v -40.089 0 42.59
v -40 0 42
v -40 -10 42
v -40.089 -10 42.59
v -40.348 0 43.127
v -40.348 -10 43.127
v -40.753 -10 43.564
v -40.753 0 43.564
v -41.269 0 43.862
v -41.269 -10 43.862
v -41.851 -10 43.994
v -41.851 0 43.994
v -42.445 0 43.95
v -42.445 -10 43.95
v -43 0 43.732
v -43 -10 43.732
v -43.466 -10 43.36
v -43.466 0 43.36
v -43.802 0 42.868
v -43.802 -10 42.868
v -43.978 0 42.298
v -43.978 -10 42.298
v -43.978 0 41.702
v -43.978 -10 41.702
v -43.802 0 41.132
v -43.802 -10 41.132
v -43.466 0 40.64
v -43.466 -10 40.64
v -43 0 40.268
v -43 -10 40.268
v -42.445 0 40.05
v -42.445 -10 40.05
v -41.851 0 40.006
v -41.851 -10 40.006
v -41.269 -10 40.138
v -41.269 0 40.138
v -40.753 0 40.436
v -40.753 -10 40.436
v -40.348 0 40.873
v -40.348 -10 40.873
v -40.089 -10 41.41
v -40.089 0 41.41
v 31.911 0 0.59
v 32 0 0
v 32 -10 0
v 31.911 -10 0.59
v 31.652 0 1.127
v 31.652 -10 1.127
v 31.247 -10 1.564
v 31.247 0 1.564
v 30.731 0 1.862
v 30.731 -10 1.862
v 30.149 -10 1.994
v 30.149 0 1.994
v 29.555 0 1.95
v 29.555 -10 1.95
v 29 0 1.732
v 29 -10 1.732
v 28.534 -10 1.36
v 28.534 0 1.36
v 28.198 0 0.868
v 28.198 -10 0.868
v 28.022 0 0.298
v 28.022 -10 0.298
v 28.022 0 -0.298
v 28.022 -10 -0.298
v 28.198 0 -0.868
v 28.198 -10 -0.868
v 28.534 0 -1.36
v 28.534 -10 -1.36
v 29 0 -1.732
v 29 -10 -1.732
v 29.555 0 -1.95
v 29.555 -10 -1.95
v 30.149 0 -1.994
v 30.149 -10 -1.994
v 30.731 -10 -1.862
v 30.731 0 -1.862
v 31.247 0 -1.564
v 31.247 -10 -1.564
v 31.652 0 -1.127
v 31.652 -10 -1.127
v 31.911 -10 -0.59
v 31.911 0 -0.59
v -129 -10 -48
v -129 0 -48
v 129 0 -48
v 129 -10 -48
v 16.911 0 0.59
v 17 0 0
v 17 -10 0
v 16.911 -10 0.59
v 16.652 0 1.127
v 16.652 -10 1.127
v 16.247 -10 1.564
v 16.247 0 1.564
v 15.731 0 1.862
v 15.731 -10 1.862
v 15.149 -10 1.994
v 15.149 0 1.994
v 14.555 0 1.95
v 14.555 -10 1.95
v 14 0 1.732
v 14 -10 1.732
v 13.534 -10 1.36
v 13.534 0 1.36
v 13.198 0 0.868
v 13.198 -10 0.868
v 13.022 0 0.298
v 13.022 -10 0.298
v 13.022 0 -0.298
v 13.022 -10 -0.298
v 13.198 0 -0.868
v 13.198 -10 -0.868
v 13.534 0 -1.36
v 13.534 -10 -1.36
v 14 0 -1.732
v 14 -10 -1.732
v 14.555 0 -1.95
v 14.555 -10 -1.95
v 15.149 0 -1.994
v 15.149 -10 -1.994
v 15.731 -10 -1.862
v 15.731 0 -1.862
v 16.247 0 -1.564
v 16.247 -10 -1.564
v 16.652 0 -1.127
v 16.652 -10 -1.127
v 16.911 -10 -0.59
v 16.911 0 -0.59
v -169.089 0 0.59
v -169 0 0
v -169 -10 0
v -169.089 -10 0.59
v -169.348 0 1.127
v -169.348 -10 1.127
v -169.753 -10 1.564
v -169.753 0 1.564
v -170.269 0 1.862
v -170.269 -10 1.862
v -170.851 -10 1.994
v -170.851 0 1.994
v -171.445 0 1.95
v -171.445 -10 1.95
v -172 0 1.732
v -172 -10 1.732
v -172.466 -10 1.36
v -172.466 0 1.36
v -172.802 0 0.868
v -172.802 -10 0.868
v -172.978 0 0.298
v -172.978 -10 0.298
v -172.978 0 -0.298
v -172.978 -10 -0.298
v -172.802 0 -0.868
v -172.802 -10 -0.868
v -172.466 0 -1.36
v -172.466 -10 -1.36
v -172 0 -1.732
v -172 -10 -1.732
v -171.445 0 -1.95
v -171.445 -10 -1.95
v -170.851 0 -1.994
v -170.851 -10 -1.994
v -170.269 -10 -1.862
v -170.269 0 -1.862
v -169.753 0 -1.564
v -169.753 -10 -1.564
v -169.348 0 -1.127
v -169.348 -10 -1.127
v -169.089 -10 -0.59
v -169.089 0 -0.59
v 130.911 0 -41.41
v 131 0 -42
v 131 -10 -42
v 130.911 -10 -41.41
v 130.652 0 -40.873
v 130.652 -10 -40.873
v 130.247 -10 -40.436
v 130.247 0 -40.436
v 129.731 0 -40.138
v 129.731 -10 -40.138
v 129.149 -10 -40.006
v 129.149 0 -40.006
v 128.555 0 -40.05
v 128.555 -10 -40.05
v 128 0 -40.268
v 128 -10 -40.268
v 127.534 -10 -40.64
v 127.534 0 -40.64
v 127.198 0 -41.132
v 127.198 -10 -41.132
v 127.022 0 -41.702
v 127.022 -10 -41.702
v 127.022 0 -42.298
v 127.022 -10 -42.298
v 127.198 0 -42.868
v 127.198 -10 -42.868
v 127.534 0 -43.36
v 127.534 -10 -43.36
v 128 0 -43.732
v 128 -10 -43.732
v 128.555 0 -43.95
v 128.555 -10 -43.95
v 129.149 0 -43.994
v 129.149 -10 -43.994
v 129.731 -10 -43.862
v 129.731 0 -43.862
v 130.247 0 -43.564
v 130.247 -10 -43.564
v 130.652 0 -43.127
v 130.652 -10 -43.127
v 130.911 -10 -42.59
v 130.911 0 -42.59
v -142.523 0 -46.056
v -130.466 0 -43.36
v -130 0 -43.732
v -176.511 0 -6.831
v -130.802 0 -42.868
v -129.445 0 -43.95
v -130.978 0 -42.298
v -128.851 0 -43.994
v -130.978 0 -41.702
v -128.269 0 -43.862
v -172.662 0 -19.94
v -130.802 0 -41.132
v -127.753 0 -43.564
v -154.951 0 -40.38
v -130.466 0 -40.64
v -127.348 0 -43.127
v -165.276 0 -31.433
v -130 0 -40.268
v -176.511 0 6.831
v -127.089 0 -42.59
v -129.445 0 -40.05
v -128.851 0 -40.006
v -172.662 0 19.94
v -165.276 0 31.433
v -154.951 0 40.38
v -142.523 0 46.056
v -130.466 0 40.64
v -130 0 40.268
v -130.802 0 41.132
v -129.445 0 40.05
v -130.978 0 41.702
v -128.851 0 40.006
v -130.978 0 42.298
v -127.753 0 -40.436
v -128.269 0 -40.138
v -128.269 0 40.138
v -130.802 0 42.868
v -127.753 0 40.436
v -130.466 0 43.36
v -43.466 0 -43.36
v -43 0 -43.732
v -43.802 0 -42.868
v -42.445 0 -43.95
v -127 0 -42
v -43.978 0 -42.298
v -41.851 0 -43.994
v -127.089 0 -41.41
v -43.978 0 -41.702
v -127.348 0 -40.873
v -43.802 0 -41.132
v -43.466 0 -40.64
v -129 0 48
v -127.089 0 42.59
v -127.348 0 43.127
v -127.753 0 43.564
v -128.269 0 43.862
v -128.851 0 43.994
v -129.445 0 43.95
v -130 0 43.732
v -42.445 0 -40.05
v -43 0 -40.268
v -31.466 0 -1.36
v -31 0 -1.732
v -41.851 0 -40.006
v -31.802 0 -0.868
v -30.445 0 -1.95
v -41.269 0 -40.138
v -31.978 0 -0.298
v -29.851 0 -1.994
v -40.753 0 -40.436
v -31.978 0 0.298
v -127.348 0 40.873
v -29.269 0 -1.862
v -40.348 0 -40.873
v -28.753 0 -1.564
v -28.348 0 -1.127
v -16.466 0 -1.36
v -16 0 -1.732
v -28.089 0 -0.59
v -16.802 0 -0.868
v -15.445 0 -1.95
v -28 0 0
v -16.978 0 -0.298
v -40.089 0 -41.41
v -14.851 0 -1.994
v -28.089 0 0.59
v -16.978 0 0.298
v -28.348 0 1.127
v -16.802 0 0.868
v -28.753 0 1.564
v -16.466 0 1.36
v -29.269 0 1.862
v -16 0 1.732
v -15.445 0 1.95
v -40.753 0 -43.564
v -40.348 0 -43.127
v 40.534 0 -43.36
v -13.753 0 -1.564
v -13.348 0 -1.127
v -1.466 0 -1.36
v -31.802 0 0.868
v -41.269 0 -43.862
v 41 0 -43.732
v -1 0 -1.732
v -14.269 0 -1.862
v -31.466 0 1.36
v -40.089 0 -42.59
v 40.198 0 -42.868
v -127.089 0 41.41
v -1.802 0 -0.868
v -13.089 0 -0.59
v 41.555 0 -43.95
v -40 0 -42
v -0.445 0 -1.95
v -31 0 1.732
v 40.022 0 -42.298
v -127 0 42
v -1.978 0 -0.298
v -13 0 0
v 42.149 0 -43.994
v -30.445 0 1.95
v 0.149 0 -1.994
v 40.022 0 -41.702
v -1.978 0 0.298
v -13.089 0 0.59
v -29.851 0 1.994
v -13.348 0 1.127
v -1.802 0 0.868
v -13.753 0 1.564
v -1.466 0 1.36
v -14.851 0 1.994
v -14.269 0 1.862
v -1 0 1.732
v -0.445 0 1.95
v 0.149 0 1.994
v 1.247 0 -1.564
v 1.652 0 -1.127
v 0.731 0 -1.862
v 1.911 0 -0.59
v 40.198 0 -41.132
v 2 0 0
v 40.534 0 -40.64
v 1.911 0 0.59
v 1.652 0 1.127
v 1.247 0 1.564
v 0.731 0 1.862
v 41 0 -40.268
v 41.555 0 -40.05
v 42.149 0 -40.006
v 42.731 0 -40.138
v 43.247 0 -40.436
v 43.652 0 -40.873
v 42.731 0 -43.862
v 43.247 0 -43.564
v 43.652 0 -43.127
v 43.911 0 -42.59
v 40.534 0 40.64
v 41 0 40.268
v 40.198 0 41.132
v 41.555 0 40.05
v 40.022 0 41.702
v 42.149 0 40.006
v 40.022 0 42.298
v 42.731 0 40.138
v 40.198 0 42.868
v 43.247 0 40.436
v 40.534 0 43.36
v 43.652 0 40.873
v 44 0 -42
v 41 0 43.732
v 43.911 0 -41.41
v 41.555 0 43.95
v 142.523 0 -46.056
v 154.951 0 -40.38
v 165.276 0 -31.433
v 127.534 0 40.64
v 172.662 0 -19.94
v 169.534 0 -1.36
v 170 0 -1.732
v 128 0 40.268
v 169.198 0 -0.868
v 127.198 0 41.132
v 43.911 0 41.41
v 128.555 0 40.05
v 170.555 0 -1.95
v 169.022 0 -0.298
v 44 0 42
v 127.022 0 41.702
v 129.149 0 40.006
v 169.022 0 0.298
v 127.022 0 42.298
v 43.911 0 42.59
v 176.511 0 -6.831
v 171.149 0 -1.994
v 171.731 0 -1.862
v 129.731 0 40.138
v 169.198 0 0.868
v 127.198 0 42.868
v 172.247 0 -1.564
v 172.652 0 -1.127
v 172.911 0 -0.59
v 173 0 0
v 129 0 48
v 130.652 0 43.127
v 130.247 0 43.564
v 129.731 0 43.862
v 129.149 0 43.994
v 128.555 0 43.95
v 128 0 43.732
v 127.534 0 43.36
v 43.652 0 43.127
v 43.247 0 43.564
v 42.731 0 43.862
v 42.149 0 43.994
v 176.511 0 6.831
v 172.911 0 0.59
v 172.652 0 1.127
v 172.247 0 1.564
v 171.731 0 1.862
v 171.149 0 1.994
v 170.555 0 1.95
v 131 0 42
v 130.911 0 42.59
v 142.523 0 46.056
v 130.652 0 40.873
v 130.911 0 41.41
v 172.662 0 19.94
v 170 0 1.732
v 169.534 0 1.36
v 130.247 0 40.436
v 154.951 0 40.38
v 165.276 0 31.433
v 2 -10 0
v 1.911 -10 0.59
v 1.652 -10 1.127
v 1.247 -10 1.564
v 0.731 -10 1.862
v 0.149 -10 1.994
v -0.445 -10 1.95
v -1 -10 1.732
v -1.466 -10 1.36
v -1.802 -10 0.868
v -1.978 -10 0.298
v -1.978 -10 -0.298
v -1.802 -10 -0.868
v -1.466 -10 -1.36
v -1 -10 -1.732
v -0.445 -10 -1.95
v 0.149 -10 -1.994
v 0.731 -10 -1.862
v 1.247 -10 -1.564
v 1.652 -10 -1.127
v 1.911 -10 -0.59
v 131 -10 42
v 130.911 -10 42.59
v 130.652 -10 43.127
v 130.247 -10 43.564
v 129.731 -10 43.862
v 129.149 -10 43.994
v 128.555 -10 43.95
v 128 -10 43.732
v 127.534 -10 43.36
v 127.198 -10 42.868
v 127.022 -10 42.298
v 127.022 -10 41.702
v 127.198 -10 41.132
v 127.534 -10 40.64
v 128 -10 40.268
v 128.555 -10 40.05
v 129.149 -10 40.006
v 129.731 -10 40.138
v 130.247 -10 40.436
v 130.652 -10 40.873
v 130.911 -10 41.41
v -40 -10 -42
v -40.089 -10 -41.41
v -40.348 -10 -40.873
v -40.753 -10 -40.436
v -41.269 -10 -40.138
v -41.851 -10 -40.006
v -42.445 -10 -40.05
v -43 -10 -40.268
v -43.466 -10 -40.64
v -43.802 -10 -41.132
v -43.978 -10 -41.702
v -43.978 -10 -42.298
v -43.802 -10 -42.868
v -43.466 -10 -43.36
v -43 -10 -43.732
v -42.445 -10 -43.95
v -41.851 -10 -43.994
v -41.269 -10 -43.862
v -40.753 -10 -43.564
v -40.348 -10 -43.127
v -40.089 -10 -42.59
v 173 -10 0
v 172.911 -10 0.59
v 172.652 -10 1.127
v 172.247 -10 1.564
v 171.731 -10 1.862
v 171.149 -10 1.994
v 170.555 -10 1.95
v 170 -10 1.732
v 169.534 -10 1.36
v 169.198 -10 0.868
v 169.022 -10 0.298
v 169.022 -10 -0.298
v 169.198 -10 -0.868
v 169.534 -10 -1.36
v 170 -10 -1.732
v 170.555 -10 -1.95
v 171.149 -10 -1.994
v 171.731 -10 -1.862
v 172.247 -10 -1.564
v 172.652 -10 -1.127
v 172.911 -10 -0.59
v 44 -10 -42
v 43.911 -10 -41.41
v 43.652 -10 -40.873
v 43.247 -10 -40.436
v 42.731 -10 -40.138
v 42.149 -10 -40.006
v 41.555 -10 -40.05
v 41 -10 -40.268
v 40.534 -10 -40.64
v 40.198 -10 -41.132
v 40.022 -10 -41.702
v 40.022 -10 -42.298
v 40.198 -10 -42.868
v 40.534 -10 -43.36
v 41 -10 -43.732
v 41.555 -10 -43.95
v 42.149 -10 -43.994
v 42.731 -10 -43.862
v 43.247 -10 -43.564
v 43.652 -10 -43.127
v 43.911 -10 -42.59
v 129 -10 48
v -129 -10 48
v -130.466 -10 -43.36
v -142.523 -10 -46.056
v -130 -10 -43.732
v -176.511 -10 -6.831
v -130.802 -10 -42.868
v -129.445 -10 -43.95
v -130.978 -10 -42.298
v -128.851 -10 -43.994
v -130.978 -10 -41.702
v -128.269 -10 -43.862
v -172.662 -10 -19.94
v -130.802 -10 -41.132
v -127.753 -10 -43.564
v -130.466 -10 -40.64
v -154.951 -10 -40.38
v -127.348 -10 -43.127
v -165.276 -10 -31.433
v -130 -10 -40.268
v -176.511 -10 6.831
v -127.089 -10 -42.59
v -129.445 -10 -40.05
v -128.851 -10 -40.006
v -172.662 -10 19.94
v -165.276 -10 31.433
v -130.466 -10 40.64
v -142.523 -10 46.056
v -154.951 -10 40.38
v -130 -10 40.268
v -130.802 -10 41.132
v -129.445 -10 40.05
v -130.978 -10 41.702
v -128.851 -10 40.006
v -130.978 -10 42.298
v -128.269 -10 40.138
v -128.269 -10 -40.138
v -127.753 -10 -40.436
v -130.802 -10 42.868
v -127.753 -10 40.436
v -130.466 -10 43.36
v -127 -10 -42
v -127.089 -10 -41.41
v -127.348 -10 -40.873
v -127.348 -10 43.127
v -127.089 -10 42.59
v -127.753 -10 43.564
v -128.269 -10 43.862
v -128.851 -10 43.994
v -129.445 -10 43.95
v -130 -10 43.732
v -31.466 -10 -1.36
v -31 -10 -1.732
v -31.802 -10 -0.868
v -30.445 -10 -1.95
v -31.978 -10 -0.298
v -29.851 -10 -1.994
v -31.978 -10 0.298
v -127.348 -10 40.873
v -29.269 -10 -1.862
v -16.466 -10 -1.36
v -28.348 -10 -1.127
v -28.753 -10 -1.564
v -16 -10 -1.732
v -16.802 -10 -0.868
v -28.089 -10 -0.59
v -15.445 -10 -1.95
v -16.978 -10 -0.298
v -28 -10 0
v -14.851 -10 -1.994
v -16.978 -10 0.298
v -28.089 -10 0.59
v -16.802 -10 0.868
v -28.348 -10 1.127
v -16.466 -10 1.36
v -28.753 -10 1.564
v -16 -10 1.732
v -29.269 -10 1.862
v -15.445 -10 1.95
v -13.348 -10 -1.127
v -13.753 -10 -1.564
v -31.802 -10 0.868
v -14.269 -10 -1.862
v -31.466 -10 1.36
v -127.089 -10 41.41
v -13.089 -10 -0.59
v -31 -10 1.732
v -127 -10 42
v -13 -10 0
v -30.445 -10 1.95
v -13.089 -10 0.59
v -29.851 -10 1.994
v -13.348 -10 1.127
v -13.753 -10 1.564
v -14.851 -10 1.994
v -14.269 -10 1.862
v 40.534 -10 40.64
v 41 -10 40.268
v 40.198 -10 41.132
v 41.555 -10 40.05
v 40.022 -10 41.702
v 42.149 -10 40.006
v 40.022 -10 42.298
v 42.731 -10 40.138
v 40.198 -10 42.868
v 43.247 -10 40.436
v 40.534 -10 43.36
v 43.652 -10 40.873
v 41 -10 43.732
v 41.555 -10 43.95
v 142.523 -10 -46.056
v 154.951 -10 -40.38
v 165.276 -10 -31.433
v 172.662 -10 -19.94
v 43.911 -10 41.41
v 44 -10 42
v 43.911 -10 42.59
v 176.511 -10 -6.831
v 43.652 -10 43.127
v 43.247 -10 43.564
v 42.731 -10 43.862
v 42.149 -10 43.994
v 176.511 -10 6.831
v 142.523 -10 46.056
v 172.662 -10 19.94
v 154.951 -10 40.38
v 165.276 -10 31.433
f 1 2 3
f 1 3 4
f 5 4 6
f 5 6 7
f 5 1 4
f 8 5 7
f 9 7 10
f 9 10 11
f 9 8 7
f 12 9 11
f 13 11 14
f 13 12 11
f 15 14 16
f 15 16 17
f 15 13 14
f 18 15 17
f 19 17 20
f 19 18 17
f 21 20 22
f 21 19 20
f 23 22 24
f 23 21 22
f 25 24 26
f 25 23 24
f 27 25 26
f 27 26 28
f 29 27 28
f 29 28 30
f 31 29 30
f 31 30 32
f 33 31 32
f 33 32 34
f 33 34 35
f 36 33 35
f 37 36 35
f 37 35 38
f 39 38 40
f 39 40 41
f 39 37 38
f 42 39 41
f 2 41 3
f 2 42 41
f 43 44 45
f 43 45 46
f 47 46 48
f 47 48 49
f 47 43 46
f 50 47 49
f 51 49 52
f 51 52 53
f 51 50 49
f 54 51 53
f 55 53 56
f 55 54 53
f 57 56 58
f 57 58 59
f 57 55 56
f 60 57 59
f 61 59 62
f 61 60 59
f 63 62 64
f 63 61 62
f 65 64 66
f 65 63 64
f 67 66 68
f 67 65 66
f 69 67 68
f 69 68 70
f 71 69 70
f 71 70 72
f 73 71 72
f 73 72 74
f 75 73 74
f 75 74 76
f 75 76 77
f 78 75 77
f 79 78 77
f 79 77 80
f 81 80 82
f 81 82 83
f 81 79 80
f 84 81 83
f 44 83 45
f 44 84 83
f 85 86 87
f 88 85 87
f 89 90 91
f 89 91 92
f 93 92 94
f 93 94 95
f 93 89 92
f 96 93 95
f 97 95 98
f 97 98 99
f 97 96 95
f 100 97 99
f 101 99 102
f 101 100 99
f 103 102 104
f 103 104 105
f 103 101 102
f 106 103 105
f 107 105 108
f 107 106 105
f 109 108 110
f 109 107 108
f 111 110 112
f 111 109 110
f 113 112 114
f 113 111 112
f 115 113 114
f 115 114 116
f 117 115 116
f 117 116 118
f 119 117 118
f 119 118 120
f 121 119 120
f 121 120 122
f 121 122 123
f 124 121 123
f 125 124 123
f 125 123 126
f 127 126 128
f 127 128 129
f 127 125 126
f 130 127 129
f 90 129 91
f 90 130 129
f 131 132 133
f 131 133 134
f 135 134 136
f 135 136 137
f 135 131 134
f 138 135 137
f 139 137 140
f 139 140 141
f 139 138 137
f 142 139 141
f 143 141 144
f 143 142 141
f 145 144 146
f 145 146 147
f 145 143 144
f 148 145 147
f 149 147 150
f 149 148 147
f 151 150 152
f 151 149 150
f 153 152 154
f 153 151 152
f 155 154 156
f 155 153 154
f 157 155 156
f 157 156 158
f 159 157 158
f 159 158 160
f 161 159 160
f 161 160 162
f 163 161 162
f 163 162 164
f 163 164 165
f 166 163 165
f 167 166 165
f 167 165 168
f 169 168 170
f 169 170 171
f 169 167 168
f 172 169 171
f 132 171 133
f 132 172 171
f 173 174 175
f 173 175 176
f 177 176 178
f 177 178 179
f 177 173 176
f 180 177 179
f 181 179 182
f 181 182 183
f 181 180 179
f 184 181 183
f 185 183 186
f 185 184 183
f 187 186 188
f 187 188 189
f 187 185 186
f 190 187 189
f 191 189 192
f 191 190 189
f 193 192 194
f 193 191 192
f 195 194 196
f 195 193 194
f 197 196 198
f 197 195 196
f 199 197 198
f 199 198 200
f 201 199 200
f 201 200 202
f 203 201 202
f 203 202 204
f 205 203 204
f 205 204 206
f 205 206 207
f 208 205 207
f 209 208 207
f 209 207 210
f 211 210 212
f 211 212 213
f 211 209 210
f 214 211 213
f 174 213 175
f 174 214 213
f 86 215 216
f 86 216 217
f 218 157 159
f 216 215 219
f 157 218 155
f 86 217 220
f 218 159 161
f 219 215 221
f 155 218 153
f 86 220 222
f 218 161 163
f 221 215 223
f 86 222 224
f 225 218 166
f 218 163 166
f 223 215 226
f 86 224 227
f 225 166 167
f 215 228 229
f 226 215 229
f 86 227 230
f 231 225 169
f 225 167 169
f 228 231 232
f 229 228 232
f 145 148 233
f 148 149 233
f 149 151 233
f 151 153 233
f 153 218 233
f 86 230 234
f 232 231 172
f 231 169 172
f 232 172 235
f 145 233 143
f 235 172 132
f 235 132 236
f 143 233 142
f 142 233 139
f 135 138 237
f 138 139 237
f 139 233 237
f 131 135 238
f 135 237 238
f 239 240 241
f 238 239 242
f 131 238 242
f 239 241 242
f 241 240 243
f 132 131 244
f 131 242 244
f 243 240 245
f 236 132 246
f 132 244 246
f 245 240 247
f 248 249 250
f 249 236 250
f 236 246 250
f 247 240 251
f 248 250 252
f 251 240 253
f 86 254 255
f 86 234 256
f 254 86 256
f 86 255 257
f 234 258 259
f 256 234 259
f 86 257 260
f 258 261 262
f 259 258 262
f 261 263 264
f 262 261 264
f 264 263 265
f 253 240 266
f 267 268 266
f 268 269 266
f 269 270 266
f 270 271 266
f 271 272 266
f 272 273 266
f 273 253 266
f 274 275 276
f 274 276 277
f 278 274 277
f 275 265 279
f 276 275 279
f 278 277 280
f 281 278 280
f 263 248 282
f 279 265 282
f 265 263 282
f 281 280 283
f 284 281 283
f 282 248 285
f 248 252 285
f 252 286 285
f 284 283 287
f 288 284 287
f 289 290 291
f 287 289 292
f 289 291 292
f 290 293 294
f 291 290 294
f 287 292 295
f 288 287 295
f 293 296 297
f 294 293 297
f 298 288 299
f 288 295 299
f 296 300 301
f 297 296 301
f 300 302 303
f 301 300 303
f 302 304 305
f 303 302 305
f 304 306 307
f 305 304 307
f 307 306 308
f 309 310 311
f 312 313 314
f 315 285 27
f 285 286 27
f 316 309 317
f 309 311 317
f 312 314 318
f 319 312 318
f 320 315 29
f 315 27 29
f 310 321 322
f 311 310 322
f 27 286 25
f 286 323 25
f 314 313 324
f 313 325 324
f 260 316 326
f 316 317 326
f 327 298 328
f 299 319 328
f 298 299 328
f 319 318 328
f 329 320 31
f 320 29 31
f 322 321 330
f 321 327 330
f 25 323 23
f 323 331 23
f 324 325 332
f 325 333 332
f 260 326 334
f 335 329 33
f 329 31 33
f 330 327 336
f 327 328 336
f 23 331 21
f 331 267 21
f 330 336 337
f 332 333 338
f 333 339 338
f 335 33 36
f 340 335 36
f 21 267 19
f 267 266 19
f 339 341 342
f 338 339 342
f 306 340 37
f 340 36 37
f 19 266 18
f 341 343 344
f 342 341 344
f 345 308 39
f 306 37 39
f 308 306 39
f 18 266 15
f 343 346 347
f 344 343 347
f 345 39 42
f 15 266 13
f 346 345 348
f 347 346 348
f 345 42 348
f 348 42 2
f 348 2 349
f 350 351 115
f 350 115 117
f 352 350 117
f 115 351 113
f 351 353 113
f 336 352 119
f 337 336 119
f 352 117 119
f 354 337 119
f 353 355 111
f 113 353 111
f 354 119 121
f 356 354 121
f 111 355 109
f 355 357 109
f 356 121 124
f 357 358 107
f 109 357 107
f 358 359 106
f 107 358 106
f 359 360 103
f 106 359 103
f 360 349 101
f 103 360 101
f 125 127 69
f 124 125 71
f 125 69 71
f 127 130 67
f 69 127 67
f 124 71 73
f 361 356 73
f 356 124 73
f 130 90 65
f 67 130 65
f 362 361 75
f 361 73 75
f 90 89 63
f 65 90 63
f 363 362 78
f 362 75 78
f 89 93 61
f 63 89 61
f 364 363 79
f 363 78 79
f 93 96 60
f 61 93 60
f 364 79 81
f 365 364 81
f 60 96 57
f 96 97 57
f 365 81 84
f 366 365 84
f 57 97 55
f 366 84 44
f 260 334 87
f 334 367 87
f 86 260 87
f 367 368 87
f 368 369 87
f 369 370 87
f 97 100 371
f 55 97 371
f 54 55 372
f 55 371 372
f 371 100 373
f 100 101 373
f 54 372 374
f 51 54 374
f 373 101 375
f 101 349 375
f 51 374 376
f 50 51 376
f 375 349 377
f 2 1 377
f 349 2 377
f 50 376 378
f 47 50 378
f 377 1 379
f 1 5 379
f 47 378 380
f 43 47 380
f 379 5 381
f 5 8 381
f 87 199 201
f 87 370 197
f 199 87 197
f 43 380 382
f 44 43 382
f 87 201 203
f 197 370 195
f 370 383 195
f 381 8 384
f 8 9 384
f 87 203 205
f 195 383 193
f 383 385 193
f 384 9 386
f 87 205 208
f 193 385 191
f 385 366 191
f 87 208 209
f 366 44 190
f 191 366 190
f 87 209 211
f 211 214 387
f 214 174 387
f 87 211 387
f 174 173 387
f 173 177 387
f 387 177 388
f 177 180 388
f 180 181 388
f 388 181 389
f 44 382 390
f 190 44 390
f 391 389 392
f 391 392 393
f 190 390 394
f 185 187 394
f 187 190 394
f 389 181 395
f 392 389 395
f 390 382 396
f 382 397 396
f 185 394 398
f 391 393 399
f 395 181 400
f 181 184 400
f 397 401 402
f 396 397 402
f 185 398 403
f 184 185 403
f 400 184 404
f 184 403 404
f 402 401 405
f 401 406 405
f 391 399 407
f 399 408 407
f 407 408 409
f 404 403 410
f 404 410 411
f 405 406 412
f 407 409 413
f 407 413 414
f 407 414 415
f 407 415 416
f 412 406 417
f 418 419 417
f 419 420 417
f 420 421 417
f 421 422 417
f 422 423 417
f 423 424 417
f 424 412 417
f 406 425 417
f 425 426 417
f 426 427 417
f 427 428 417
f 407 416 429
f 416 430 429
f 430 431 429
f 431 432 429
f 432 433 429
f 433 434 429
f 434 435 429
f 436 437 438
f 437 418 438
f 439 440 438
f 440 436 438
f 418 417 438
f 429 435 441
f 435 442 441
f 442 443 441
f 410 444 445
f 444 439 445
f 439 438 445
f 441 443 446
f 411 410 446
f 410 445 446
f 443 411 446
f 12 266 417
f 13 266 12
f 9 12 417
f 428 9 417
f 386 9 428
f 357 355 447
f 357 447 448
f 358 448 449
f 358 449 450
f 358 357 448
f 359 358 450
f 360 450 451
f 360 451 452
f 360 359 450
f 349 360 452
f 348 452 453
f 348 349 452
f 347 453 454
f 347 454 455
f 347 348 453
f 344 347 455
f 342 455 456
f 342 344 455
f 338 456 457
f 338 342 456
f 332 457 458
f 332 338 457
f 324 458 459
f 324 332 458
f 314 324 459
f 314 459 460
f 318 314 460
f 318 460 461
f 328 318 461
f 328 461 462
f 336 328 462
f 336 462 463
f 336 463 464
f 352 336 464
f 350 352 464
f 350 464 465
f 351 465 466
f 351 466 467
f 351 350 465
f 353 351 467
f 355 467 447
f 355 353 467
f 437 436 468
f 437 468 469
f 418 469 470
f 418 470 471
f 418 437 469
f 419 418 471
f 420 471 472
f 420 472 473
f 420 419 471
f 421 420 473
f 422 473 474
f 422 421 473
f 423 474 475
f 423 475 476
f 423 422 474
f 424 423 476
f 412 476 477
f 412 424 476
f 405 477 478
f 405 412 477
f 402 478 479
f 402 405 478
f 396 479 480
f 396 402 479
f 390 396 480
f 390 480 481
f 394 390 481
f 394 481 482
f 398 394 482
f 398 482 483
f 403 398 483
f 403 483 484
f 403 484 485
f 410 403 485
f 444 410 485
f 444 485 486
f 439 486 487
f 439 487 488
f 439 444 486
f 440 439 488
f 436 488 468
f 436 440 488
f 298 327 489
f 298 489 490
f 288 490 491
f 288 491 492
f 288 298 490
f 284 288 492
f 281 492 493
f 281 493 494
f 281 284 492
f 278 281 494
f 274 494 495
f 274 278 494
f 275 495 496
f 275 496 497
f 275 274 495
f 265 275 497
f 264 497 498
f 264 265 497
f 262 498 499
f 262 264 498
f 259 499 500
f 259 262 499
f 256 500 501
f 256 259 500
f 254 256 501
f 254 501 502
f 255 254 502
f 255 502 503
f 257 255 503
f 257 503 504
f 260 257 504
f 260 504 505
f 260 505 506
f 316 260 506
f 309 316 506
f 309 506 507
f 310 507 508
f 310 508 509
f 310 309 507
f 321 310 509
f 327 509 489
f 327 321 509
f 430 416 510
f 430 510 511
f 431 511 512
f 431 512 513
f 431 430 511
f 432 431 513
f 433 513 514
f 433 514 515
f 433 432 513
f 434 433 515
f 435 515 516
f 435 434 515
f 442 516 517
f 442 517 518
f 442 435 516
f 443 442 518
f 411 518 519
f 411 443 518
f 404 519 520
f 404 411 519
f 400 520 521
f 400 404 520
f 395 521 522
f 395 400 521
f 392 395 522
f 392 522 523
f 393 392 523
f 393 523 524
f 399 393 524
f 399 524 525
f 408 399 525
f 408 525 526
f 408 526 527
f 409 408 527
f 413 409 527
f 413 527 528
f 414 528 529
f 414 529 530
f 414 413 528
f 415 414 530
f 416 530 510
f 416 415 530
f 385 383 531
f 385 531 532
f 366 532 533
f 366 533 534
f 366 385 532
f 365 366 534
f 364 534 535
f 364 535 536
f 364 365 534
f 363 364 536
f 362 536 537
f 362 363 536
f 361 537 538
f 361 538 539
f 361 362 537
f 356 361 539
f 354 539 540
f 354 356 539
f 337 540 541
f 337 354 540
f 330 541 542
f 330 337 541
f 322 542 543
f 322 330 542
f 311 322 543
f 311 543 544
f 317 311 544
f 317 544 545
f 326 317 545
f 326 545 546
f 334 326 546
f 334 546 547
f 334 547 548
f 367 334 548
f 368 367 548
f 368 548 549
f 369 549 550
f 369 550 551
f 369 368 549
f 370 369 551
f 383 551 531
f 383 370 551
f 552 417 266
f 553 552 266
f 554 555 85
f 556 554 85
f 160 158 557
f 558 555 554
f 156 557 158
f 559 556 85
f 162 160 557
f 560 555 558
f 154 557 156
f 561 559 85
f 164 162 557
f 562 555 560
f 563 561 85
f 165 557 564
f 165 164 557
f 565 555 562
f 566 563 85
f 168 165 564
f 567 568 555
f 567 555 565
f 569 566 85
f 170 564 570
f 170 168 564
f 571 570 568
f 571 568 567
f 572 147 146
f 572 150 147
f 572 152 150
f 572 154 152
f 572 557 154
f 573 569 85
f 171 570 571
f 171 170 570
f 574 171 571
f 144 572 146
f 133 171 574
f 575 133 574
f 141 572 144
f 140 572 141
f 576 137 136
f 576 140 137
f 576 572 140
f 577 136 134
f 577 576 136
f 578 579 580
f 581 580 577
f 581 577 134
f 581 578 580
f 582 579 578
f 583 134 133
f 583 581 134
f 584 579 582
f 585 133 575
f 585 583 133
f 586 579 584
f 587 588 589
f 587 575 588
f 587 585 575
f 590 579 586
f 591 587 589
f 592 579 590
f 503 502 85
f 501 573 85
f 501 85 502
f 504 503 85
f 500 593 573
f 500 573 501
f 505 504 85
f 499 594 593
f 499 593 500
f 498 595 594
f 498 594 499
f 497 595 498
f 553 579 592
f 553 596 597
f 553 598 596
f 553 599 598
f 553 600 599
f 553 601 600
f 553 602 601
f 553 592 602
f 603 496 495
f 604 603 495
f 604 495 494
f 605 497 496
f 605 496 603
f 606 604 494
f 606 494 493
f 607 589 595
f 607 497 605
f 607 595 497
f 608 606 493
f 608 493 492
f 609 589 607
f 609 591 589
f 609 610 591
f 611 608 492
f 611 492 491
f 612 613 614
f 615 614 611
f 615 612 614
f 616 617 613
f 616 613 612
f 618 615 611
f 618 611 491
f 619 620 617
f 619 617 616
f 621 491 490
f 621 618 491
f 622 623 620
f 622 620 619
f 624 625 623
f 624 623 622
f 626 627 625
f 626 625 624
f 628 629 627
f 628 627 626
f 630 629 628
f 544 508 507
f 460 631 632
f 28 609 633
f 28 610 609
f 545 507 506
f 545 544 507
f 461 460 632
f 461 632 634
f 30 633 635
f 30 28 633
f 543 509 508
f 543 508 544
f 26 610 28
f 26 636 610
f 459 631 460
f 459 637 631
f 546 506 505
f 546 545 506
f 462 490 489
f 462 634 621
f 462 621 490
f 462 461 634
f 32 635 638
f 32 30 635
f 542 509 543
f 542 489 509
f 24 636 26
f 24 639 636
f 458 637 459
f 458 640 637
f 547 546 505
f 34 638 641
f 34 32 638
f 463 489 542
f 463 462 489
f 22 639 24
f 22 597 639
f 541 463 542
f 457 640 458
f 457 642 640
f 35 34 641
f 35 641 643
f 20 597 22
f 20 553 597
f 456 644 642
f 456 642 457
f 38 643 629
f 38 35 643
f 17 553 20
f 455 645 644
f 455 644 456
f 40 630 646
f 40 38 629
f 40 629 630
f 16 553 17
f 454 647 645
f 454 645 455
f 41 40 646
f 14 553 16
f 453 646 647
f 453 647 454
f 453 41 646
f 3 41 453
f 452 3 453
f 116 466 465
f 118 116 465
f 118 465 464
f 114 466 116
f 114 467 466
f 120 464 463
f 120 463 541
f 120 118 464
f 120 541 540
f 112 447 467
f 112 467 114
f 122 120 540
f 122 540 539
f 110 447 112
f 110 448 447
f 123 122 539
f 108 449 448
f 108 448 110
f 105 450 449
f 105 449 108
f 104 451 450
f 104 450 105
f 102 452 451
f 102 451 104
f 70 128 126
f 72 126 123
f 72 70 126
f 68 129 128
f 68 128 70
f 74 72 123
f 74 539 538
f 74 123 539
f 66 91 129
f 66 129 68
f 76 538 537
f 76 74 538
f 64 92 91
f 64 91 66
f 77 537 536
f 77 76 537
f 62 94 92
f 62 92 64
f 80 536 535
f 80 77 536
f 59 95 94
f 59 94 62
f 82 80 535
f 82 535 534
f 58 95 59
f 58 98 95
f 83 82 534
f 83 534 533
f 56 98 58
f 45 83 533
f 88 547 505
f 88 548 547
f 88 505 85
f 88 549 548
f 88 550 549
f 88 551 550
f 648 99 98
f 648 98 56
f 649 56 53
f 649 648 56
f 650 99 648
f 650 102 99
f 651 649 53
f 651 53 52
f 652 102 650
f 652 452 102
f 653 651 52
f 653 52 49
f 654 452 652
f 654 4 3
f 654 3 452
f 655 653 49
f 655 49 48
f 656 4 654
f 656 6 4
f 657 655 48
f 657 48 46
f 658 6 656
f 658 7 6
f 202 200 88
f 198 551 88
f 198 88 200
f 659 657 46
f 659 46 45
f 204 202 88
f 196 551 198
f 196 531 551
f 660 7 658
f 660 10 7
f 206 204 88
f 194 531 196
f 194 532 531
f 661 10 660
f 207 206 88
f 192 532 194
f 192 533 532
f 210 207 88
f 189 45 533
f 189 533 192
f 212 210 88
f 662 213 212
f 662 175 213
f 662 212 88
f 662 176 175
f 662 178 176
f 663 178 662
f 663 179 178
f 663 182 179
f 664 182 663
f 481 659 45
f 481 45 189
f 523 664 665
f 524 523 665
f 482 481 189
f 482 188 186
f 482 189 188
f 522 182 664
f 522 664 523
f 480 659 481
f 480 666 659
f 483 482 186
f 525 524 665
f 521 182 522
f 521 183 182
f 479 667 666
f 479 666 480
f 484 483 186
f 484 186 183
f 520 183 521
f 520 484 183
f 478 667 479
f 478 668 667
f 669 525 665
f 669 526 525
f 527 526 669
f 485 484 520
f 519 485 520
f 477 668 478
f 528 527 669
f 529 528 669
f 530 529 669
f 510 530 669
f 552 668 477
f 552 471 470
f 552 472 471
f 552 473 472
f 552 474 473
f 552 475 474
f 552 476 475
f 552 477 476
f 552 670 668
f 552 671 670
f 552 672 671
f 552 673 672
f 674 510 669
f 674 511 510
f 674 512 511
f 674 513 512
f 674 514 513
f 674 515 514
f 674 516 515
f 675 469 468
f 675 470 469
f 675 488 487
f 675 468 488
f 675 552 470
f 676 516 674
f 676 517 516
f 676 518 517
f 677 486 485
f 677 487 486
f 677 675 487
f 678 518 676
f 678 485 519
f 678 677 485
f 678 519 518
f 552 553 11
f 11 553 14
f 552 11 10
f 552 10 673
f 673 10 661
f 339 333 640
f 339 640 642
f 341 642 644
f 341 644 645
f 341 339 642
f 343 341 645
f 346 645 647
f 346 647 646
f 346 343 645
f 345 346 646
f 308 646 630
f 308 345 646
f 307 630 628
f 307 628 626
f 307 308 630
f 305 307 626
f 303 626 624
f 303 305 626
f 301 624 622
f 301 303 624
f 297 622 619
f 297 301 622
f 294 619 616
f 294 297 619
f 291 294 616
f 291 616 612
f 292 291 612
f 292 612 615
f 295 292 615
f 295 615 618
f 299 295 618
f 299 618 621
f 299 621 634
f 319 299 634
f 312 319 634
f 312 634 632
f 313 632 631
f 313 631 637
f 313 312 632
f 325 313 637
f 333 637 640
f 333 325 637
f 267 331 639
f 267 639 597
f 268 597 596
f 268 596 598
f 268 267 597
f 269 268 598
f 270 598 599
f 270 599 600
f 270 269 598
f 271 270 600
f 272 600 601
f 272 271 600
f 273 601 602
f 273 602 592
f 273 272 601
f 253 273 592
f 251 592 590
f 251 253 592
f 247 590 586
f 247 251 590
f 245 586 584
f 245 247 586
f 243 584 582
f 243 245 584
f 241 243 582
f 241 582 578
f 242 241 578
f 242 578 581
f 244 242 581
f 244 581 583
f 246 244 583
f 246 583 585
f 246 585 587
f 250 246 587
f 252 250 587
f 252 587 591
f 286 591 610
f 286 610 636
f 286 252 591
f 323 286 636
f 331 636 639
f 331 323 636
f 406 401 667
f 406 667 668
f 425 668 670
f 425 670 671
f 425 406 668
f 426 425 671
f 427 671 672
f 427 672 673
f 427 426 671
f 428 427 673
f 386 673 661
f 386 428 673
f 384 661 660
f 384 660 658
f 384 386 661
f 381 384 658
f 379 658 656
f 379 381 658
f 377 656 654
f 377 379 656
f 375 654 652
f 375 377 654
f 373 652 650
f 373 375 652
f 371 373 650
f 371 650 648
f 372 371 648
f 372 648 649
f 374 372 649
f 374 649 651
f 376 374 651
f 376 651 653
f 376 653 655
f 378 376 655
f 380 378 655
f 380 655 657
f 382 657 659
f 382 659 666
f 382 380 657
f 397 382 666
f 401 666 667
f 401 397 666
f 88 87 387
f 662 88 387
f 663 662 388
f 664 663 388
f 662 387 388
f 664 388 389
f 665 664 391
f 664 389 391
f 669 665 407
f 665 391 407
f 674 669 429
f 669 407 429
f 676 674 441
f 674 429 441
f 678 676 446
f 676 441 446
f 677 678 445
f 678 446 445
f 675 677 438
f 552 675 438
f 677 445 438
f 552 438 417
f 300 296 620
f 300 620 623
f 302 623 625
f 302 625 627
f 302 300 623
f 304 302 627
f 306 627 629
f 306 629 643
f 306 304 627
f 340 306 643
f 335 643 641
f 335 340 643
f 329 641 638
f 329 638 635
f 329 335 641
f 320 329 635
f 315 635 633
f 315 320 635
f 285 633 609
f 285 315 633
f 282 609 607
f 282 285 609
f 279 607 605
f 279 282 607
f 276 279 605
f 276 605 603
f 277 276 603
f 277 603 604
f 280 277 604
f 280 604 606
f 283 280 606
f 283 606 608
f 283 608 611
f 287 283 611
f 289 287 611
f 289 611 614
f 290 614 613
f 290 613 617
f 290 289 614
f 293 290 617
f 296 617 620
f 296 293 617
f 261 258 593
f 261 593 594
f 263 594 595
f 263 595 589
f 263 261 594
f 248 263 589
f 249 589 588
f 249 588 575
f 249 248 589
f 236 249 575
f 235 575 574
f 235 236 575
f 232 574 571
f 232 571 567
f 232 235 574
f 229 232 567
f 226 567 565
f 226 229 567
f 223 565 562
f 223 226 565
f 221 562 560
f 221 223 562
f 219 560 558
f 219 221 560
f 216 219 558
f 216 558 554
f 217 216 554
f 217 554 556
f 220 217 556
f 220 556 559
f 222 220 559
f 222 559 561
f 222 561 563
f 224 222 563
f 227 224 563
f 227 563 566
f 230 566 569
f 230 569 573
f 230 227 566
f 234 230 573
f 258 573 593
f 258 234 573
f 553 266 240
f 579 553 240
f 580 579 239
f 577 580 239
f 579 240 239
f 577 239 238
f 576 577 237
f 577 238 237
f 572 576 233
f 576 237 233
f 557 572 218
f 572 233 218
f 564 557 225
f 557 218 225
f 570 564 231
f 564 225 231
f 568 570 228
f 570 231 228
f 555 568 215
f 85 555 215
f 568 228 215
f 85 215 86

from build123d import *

# Parameters (mm, degrees)
F0_R     = 2
F1_DEPTH = 10


with BuildPart() as f1:
    # F0 (on Front) → F1 (new body)
    with BuildSketch(Plane.XZ):
        with BuildLine():
            ThreePointArc((129, -48), (177, 0), (129, 48))
            Line((129, 48), (0, 48))
            Line((0, 48), (-129, 48))
            ThreePointArc((-129, 48), (-177, 0), (-129, -48))
            Line((-129, -48), (0, -48))
            Line((0, -48), (129, -48))
        make_face()
        with Locations((-129, -42)):
            Circle(F0_R, mode=Mode.SUBTRACT)
        with Locations((-42, -42)):
            Circle(F0_R, mode=Mode.SUBTRACT)
        with Locations((42, -42)):
            Circle(F0_R, mode=Mode.SUBTRACT)
        with Locations((129, -42)):
            Circle(F0_R, mode=Mode.SUBTRACT)
        with Locations((-171, 0)):
            Circle(F0_R, mode=Mode.SUBTRACT)
        with Locations((-30, 0)):
            Circle(F0_R, mode=Mode.SUBTRACT)
        with Locations((-15, 0)):
            Circle(F0_R, mode=Mode.SUBTRACT)
        with Locations((-129, 42)):
            Circle(F0_R, mode=Mode.SUBTRACT)
        with Locations((-42, 42)):
            Circle(F0_R, mode=Mode.SUBTRACT)
        Circle(F0_R, mode=Mode.SUBTRACT)
        with Locations((15, 0)):
            Circle(F0_R, mode=Mode.SUBTRACT)
        with Locations((30, 0)):
            Circle(F0_R, mode=Mode.SUBTRACT)
        with Locations((171, 0)):
            Circle(F0_R, mode=Mode.SUBTRACT)
        with Locations((42, 42)):
            Circle(F0_R, mode=Mode.SUBTRACT)
        with Locations((129, 42)):
            Circle(F0_R, mode=Mode.SUBTRACT)
    extrude(amount=F1_DEPTH)


solid = f1.part
